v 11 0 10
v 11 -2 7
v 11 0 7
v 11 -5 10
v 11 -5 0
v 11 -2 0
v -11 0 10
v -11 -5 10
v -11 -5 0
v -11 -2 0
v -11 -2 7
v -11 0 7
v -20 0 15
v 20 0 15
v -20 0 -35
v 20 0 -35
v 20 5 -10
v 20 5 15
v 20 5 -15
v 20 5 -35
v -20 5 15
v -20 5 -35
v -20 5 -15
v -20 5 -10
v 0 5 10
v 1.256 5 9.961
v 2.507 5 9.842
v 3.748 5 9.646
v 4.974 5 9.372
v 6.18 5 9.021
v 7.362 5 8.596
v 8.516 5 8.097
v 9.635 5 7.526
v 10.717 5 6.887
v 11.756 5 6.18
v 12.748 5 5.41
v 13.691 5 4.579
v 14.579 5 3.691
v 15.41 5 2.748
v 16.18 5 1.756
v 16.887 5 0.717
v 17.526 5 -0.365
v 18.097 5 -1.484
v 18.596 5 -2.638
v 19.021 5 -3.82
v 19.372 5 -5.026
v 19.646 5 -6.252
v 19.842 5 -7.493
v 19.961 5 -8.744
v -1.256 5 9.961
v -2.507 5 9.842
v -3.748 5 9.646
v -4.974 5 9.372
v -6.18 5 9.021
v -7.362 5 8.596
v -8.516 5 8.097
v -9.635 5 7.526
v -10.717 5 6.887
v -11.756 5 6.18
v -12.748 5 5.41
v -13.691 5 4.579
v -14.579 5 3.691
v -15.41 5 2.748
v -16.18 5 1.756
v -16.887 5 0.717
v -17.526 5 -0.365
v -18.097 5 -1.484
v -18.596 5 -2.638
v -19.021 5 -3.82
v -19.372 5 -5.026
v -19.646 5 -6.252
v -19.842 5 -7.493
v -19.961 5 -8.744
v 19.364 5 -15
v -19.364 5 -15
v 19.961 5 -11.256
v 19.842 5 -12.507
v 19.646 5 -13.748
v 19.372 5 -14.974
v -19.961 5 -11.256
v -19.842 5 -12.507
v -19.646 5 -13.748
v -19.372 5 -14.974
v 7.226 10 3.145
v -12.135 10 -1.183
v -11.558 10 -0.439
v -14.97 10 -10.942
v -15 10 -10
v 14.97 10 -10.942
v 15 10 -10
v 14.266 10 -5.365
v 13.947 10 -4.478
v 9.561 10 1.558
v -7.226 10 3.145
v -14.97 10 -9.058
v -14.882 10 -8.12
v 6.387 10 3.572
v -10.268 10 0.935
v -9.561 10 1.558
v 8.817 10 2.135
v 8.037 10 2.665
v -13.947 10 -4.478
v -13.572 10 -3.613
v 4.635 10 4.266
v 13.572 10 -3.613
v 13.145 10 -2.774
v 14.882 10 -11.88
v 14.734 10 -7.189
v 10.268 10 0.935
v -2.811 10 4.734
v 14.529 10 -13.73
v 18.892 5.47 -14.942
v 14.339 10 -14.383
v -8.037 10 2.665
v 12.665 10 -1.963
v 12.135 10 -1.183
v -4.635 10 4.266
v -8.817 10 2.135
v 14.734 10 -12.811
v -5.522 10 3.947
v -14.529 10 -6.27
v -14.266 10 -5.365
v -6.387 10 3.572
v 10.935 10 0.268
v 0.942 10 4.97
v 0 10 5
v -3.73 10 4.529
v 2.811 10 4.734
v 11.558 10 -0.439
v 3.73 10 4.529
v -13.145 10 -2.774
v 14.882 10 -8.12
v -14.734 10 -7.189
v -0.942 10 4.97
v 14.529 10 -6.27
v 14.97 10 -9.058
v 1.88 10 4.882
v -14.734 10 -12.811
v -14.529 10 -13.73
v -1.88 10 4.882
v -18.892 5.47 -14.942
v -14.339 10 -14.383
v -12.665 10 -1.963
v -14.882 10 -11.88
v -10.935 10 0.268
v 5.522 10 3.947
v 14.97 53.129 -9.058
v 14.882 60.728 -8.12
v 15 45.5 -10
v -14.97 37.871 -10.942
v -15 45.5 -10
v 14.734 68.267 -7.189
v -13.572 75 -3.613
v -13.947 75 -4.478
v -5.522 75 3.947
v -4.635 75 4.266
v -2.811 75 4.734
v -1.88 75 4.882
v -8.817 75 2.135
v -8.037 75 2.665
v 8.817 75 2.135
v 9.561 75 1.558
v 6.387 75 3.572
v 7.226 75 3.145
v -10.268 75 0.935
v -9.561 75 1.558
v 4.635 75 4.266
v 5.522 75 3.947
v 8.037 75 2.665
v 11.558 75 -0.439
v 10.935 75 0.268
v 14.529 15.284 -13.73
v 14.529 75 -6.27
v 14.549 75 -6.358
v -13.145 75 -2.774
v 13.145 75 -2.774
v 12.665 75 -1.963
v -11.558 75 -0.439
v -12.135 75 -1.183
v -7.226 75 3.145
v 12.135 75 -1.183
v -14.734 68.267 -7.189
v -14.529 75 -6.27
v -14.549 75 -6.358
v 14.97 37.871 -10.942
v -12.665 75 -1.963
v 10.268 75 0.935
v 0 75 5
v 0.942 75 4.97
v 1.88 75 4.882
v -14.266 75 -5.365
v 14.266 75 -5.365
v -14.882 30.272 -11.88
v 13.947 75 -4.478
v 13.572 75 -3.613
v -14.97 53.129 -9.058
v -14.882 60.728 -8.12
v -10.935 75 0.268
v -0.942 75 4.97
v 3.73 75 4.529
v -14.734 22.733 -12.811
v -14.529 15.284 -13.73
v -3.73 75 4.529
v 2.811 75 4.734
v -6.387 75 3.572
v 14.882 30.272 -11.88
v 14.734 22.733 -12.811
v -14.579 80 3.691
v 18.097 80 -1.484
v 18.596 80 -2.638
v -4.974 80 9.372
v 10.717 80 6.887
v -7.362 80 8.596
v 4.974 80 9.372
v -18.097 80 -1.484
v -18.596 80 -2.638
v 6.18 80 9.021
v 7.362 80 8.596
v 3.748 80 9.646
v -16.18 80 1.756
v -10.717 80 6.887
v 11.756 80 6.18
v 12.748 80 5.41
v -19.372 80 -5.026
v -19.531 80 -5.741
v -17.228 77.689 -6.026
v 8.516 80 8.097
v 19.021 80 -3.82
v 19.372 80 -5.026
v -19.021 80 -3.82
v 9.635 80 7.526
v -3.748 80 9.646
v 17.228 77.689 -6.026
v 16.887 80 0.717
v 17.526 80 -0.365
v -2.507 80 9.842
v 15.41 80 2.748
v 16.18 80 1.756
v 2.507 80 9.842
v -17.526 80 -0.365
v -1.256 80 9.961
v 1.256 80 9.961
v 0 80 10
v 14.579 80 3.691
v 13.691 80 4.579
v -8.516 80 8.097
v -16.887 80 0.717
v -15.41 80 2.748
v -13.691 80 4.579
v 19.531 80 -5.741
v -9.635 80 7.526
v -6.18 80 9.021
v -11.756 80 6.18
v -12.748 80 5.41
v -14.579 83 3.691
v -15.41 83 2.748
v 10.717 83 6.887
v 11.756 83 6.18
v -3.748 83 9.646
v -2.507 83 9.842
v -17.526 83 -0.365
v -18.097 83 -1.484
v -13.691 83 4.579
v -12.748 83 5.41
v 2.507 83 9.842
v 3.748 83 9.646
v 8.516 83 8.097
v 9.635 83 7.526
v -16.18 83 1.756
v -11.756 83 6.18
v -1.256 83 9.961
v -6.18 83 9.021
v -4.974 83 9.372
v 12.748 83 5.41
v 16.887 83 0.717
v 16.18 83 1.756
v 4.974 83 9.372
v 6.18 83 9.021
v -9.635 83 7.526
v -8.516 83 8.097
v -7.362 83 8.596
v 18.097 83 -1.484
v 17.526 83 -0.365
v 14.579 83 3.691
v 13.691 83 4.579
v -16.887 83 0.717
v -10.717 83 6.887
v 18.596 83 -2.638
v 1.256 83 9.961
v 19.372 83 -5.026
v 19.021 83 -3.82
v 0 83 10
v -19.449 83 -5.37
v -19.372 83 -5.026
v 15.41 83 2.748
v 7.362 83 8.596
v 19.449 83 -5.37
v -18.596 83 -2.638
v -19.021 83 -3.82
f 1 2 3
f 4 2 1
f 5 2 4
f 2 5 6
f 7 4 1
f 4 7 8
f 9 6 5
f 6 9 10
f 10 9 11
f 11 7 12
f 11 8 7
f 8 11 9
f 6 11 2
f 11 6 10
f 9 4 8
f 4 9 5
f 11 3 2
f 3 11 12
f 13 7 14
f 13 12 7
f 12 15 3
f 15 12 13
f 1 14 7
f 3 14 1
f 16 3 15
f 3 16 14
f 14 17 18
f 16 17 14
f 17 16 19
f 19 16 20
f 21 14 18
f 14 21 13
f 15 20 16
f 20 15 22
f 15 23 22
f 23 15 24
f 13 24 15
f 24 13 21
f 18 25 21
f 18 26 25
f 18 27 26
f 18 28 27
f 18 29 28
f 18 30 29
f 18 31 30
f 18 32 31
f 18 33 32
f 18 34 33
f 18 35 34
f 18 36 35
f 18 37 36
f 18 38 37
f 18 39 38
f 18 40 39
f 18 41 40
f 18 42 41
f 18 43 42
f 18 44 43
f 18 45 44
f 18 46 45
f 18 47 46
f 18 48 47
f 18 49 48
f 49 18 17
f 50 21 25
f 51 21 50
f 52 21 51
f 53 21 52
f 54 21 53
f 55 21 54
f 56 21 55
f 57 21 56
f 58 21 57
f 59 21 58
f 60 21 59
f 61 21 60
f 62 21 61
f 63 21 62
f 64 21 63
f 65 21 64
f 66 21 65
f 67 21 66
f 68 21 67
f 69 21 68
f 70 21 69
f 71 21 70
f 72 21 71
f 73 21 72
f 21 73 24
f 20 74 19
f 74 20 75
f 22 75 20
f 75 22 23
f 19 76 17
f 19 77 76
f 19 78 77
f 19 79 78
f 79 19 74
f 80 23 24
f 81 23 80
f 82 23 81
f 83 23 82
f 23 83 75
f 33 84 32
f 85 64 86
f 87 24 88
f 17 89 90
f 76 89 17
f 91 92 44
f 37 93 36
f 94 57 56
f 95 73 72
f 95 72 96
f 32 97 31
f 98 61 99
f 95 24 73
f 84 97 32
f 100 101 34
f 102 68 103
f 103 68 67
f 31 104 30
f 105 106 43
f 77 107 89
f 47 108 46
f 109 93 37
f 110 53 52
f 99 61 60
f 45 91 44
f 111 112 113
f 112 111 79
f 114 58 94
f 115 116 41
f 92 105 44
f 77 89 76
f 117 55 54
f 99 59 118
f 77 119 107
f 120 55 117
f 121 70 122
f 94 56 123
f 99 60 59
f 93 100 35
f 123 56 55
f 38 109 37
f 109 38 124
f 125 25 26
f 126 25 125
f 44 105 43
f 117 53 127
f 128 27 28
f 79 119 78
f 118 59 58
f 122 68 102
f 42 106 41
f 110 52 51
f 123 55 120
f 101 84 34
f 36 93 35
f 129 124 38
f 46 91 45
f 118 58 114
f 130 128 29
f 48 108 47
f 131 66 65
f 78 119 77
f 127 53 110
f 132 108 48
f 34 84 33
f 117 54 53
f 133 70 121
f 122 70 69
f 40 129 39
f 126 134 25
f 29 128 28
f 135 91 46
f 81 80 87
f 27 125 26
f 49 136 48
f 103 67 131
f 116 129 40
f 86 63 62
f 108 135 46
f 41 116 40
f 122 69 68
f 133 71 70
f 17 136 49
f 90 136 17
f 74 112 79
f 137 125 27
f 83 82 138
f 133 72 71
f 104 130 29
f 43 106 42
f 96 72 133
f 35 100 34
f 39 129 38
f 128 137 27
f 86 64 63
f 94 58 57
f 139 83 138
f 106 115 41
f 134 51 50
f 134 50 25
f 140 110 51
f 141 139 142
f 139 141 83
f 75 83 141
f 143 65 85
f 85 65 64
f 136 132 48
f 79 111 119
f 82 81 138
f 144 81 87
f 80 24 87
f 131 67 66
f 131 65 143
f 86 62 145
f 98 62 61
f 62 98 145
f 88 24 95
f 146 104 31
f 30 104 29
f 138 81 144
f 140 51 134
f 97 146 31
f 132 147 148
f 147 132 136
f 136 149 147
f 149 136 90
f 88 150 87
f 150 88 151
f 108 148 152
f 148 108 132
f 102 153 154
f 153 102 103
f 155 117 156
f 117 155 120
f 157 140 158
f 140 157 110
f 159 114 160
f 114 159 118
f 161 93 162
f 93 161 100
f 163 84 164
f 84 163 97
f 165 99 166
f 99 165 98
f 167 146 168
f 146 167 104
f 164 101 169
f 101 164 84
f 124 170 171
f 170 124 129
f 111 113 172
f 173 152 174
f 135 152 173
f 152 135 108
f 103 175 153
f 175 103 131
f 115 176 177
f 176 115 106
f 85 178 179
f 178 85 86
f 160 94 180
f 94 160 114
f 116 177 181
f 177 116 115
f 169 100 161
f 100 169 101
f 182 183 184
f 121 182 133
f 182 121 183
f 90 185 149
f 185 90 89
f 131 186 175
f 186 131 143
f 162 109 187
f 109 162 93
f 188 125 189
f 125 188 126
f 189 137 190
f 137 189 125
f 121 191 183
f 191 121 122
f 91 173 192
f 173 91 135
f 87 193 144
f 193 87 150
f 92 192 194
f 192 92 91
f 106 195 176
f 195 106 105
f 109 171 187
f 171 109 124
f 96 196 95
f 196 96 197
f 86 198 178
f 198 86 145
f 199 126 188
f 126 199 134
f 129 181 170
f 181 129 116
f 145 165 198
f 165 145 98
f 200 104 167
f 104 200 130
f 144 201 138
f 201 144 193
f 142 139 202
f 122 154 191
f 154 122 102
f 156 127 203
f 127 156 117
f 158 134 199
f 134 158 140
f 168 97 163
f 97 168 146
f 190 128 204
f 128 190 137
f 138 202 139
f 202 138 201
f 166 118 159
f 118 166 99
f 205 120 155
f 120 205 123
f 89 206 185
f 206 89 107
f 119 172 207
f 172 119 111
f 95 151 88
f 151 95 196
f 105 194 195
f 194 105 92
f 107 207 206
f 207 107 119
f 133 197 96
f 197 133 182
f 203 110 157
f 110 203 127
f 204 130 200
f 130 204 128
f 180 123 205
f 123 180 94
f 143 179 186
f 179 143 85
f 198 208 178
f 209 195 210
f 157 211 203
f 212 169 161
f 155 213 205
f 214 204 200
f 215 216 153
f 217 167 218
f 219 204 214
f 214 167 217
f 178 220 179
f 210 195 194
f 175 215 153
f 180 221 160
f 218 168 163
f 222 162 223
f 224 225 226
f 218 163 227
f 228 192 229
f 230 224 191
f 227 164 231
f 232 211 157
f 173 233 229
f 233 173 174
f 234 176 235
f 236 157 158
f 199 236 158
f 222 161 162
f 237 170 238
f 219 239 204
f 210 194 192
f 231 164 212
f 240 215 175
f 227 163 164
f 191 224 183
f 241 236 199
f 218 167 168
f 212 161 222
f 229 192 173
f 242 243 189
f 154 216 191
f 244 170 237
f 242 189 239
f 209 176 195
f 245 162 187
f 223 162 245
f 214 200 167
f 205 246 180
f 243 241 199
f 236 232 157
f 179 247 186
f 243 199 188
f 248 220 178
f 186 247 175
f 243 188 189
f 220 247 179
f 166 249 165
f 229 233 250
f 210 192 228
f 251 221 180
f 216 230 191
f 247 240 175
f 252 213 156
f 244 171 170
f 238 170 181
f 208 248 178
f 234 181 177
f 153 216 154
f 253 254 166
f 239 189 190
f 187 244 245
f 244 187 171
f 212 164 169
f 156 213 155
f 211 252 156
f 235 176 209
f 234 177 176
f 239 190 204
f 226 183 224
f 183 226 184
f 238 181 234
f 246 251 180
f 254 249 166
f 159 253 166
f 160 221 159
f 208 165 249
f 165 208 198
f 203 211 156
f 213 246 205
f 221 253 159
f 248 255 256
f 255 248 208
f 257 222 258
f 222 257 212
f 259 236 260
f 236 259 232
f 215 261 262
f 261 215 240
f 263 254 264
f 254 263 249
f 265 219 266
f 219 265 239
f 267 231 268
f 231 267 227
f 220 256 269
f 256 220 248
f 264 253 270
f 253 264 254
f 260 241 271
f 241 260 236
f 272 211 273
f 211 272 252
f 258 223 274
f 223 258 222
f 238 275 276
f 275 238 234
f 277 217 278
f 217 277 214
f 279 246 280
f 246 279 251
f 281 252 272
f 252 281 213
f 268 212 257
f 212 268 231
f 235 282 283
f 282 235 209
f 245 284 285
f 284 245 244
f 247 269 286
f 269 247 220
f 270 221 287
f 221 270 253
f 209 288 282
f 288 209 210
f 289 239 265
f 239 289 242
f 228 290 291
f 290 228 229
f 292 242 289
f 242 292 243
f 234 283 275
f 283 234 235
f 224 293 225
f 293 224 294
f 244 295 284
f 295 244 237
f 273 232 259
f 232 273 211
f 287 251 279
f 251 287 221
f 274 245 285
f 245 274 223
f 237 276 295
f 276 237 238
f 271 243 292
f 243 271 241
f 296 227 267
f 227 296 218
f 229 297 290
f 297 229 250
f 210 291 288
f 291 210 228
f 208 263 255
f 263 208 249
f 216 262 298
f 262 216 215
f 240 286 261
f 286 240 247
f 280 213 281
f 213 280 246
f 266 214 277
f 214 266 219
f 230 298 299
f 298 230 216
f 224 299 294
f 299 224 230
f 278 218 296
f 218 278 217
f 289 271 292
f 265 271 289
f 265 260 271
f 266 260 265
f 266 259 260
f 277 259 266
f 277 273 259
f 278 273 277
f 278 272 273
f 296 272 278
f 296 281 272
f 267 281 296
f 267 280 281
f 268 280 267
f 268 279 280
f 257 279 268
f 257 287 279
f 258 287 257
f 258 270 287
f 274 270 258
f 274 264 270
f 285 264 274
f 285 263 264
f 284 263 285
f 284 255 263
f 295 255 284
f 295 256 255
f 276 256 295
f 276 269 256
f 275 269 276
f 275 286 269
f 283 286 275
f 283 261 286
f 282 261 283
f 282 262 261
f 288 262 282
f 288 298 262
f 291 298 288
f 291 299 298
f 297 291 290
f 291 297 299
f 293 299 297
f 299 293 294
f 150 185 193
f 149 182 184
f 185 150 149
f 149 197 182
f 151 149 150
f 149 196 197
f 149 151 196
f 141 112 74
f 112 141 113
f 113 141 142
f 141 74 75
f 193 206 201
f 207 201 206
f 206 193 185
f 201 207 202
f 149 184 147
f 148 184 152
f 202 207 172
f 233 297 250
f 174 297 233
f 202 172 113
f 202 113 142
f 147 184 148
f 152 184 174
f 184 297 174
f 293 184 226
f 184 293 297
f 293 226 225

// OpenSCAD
// UP-grade is a customisable roll holder for the UP mini 3D printer
// so this small printer can carry big filament rolls
// https://www.up3d.com/?r=mini

// Written for OpenScad by Bruno Herfst 2016
// http://www.openscad.org

// NOTE: If I added a 0 to a variable it is it doesn't show in the custumizer

// Roll Spec
rollWidth = 70;

// Holder spec
holderDepth        = 10;
holderLever        = 0;
bevelWidth         = 5;
lipTickness        = 3;
holderDiameter     = 30;
backWallThickness  = 5+0;
frontWallThickness = 3+0;

// Printer Spec
pHoleWidth = 22+0; // 24 Actual
pHoleHeiht = 10+0; // 12 Actual
pWall      = 2 +0;  //  1 Actual

// Short cuts
hDepth   = holderDepth/2;
rWidth   = rollWidth + bevelWidth;
// Material Saver
ms_Height = ((holderDiameter+holderDepth)/100)*25;
ms_Offset = ((holderDiameter+holderDepth)/100)*25;
// Backwall
bwWidth  = holderDiameter + holderDepth;
bwHeight = holderDiameter + (holderDepth*2) + holderLever;

$fn = 100;

module prism(l, w, h){
    polyhedron(
        points=[[0,0,0], [l,0,0], [l,w,0], [0,w,0], [0,w,h], [l,w,h]],
        faces=[[0,1,2,3],[5,4,3,2],[0,4,5,1],[0,3,4],[5,2,1]]
    );
}

difference() {
// Create holder
union() { 
    // Create lip
    translate([-(pHoleWidth/2),-(pWall+lipTickness),0]) {
        cube([pHoleWidth,lipTickness,pHoleHeiht]);
        translate([0,0,pHoleHeiht-lipTickness]) {
            cube([pHoleWidth,lipTickness+pWall,lipTickness]);
        }
    }

    // Create backWall
    translate([-bwWidth/2,0,-(bwHeight-pHoleHeiht)+hDepth]){
        cube([bwWidth,backWallThickness,bwHeight]);
    }
    
    // Bevel
    translate([0,backWallThickness+(bevelWidth/2),pHoleHeiht-hDepth-(holderDiameter/2)]){
        rotate([-90,0,0])
        cylinder(  bevelWidth, d1=holderDiameter+holderDepth, d2=holderDiameter, center=true);
    }
    
    // Create holder
    translate([0,rWidth/2+backWallThickness,pHoleHeiht-hDepth-(holderDiameter/2)]){
        rotate([90,0,0])
        cylinder(  rWidth, d=holderDiameter, center=true);
    }

    // Create holder finish
    // Bevel
    translate([0,rWidth+backWallThickness-(bevelWidth/2),pHoleHeiht-hDepth-(holderDiameter/2)]){
        rotate([90,0,0])
        cylinder(  bevelWidth, d1=holderDiameter+holderDepth, d2=holderDiameter, center=true);
    }
    translate([0,rWidth+backWallThickness+frontWallThickness-(frontWallThickness/2),pHoleHeiht-hDepth-(holderDiameter/2)]){
        rotate([90,0,0])
        cylinder(  frontWallThickness, d=holderDiameter+holderDepth, center=true);
    }
}
// Create material saver
union() {
    translate([-bwWidth/2,backWallThickness,pHoleHeiht-hDepth-holderDiameter+ms_Offset]){
        prism(bwWidth, rWidth+frontWallThickness+3, ms_Height);
    }
    translate([-bwWidth/2,backWallThickness,pHoleHeiht-hDepth-holderDiameter-bwHeight+ms_Offset]){
        cube([bwWidth, rWidth+frontWallThickness+3, bwHeight]);
    }
}
}
